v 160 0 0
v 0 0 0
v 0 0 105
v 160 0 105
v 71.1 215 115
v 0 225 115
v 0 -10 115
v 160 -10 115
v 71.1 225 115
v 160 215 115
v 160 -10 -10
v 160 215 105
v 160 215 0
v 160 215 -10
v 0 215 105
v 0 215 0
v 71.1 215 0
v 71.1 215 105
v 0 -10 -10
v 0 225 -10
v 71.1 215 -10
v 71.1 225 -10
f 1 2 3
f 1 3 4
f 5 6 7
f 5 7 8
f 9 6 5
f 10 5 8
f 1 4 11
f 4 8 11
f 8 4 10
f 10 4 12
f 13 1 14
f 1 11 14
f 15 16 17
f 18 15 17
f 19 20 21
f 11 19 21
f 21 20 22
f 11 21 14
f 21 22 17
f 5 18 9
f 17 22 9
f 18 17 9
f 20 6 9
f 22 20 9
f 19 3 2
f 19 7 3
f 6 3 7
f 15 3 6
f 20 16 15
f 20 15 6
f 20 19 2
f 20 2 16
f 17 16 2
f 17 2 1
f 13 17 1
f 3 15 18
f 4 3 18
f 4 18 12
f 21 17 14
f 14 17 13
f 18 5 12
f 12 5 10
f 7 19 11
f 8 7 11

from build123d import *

# Parameters (mm, degrees)
SKETCH1_W           = 160
SKETCH1_H           = 215
BOSS_EXTRUDE1_DEPTH = 105
SHELL2_T            = 10
SKETCH6_W           = 88.9
SKETCH6_H           = 125
CUT_EXTRUDE3_DEPTH  = 10


with BuildPart() as part:
    # Sketch1 → Boss-Extrude1 (new body)
    with BuildSketch(Plane.XY):
        with Locations((80, 107.5)):
            Rectangle(SKETCH1_W, SKETCH1_H)
    extrude(amount=BOSS_EXTRUDE1_DEPTH)

    # Shell2
    shell2_openings = [part.faces().sort_by_distance(p)[0] for p in [
        (160, 107.5, 52.5),
        (0, 107.5, 52.5),
    ]]
    offset(amount=SHELL2_T, openings=shell2_openings, kind=Kind.INTERSECTION)

    # Sketch6 → Cut-Extrude3 (cut)
    with BuildSketch(Plane.XZ.offset(-225)):
        with Locations((115.55, 52.5)):
            Rectangle(SKETCH6_W, SKETCH6_H)
    extrude(amount=CUT_EXTRUDE3_DEPTH, mode=Mode.SUBTRACT)


solid = part.part
